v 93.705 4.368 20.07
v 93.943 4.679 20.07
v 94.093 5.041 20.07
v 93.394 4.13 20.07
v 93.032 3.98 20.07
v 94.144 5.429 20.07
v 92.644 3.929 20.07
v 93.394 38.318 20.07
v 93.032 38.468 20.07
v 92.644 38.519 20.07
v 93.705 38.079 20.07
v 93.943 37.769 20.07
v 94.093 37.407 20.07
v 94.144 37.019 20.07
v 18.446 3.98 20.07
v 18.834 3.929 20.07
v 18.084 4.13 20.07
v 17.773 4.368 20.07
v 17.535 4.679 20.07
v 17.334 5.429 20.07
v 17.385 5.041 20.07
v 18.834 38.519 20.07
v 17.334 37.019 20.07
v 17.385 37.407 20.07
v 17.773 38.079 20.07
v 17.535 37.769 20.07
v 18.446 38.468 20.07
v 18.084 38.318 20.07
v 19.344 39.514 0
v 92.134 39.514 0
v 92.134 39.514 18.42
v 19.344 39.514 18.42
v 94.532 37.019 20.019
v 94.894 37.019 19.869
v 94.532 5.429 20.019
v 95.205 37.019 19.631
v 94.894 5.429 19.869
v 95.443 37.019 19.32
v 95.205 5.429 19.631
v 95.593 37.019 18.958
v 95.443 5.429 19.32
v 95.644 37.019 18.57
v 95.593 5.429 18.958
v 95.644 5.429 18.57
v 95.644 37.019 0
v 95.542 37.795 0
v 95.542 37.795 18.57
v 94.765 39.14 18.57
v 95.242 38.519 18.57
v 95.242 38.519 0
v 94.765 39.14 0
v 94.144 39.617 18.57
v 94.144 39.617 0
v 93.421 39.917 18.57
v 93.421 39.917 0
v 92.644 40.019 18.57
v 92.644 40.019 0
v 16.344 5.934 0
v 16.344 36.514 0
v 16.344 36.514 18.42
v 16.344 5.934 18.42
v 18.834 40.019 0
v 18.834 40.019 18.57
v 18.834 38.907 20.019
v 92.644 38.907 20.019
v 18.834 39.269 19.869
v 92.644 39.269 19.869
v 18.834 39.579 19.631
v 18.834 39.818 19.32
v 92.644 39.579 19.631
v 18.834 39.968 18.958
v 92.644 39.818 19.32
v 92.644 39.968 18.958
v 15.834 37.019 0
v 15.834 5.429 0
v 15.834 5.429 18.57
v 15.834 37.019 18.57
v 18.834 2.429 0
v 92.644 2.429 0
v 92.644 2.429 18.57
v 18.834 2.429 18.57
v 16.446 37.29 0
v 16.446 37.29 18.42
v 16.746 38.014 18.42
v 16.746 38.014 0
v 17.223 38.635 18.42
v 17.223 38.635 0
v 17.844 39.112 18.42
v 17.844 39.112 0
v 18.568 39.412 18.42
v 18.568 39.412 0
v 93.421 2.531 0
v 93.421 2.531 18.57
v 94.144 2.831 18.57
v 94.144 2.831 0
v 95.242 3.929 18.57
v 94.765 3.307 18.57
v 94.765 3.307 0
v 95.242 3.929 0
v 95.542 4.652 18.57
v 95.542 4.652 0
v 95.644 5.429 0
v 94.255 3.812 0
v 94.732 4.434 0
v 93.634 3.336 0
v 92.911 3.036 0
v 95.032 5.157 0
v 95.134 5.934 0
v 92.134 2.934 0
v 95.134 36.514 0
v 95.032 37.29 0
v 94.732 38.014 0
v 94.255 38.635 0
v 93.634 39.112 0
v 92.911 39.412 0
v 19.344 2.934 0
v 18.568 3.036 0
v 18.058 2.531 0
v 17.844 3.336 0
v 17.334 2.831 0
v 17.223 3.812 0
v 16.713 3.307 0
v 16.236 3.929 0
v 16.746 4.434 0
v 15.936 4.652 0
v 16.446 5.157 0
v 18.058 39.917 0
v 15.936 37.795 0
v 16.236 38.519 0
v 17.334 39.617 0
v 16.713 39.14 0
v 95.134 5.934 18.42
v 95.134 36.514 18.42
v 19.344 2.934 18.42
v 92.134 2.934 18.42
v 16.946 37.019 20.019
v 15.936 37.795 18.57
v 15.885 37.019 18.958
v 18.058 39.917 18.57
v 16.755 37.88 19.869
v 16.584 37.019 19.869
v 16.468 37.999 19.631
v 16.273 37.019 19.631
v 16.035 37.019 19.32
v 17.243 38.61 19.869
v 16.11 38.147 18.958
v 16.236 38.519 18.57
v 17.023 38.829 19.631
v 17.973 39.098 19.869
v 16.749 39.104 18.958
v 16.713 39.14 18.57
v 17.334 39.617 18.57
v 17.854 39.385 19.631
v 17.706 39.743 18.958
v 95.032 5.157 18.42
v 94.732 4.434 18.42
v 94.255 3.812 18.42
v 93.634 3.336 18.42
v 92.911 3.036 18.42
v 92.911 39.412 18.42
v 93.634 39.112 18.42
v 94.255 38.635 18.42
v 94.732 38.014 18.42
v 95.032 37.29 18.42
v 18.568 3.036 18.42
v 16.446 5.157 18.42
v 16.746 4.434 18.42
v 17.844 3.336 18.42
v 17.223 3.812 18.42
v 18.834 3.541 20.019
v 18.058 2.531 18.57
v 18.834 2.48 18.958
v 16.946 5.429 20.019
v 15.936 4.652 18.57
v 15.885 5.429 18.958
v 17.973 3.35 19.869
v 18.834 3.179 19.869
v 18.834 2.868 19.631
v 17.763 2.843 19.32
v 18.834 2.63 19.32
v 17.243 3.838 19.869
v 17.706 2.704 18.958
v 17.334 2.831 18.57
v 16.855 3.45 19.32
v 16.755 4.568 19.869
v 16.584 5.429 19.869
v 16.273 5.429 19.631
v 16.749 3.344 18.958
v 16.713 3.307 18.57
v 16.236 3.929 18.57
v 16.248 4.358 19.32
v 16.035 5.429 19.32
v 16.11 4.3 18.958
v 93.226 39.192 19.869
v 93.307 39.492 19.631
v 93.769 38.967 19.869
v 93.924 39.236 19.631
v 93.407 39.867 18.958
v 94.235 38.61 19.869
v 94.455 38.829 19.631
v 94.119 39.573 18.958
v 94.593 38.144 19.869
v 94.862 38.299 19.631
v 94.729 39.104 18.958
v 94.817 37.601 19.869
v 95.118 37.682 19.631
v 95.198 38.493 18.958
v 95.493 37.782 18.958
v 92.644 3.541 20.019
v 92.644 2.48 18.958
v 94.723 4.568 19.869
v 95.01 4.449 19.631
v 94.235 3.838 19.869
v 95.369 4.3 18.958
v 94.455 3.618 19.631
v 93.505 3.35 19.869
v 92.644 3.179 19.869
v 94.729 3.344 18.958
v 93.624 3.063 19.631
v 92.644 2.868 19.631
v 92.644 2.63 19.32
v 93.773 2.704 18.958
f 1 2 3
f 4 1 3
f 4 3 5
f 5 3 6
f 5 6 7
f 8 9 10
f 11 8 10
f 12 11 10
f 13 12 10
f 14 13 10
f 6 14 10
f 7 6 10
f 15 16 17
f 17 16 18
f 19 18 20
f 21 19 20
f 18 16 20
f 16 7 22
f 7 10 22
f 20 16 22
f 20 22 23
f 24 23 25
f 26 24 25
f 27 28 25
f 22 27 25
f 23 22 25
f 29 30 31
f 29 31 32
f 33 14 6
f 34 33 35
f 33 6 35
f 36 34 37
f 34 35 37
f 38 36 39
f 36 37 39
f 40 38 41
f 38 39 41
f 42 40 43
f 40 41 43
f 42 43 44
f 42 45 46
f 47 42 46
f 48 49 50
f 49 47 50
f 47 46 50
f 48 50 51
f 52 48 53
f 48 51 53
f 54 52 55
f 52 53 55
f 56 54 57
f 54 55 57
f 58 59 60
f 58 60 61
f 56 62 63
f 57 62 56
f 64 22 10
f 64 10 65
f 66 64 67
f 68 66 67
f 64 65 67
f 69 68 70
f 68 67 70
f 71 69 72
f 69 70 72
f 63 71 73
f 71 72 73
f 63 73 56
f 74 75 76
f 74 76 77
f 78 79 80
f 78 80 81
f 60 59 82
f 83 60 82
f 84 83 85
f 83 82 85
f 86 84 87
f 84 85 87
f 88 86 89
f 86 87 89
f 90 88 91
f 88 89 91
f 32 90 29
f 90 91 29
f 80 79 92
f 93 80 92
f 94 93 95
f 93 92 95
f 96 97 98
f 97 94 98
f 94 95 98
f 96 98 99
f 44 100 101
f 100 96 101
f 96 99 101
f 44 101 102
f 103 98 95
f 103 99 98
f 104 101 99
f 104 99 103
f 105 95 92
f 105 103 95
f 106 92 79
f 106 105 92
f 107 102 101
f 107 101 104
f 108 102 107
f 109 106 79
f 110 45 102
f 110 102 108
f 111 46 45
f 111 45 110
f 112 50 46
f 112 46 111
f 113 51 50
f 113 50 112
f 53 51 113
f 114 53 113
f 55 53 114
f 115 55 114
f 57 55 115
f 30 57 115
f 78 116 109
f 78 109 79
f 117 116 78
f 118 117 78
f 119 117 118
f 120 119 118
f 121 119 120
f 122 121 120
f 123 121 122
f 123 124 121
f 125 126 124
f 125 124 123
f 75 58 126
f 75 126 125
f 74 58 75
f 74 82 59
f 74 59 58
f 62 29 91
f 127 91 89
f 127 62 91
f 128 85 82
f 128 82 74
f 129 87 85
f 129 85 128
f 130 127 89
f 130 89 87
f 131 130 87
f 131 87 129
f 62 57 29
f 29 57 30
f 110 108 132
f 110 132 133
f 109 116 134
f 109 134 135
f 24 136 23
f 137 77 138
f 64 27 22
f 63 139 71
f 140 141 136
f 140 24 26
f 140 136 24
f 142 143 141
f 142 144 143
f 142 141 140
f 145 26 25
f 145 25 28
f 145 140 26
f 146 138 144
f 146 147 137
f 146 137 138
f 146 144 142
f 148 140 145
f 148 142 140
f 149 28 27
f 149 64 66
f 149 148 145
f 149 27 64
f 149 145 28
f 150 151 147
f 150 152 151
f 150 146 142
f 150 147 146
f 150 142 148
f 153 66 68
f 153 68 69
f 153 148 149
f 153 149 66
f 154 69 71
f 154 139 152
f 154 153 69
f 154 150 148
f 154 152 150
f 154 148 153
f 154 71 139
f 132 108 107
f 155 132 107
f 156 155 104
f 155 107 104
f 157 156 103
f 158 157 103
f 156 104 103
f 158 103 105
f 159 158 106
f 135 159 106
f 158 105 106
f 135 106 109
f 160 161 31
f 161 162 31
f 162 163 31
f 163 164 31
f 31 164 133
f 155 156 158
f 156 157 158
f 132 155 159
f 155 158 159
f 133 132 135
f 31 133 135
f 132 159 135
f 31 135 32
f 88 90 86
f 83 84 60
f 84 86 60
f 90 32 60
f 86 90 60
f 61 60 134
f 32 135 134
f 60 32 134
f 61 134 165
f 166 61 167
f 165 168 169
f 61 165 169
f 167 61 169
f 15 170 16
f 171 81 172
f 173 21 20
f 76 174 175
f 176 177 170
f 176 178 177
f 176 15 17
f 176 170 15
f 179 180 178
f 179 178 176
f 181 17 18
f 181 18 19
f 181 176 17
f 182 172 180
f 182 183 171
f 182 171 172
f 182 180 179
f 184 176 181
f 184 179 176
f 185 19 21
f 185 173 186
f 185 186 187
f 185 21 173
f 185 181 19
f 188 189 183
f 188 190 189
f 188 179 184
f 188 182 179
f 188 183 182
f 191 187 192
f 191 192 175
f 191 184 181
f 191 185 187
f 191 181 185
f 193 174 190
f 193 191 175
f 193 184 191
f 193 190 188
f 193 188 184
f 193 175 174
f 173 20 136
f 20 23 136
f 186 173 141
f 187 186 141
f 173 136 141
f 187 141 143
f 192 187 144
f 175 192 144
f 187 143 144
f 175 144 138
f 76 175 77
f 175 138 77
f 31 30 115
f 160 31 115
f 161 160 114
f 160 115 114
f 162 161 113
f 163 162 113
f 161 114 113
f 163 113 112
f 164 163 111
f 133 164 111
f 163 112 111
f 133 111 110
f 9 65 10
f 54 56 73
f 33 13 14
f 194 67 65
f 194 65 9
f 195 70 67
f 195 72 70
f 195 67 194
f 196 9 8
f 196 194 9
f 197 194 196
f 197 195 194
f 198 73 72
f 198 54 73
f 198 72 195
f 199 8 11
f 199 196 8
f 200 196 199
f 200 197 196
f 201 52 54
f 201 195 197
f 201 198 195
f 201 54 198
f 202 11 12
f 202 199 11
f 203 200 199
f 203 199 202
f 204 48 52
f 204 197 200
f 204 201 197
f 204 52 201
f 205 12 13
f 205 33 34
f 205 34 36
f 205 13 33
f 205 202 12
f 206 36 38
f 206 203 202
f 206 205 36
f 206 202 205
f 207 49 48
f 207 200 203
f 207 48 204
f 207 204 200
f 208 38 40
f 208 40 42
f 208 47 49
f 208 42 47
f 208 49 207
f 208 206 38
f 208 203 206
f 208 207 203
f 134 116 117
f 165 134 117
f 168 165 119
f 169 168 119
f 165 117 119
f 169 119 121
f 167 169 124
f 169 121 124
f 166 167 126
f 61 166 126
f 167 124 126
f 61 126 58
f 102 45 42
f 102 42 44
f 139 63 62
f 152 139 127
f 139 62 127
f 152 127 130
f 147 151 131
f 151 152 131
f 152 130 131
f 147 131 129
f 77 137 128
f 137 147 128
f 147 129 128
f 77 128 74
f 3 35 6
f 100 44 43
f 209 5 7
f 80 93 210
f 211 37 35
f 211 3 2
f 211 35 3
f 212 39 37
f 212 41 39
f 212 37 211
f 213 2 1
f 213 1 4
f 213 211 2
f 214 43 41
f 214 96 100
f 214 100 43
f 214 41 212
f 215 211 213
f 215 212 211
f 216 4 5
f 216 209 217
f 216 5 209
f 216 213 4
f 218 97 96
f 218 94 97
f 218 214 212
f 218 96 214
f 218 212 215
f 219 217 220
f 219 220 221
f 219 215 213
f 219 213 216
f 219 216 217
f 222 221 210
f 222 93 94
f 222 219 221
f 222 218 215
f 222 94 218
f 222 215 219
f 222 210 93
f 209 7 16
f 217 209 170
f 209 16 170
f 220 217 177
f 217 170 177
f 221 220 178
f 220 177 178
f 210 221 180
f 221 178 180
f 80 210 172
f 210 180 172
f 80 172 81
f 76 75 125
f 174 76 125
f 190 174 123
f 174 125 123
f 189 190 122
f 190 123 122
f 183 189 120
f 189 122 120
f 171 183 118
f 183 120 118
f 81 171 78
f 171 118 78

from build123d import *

# Parameters (mm, degrees)
PAD_DEPTH    = 20.07
POCKET_DEPTH = 18.42
FILLET_R     = 1.5


with BuildPart() as part:
    # Sketch → Pad (new body)
    with BuildSketch(Plane.XY):
        with BuildLine():
            Line((18.834122, 40.018788), (92.644122, 40.018788))
            ThreePointArc((95.644122, 37.018788), (94.765442, 39.140108), (92.644122, 40.018788))
            Line((95.644122, 37.018788), (95.644122, 5.428788))
            ThreePointArc((92.644122, 2.428788), (94.765442, 3.307467), (95.644122, 5.428788))
            Line((92.644122, 2.428788), (18.834122, 2.428788))
            ThreePointArc((15.834122, 5.428788), (16.712801, 3.307467), (18.834122, 2.428788))
            Line((15.834122, 5.428788), (15.834122, 37.018788))
            ThreePointArc((18.834122, 40.018788), (16.712801, 39.140108), (15.834122, 37.018788))
        make_face()
    extrude(amount=PAD_DEPTH)

    # Sketch001 (on Face9 of Pad) → Pocket (cut)
    with BuildSketch(Plane(origin=(0, 0, 0), x_dir=(1, 0, 0), z_dir=(0, 0, -1))):
        with BuildLine():
            Line((19.344122, -2.933788), (92.134122, -2.933788))
            ThreePointArc((95.134122, -5.933788), (94.255442, -3.812467), (92.134122, -2.933788))
            Line((95.134122, -5.933788), (95.134122, -36.513788))
            ThreePointArc((92.134122, -39.513788), (94.255442, -38.635108), (95.134122, -36.513788))
            Line((92.134122, -39.513788), (19.344122, -39.513788))
            ThreePointArc((16.344122, -36.513788), (17.222801, -38.635108), (19.344122, -39.513788))
            Line((16.344122, -36.513788), (16.344122, -5.933788))
            ThreePointArc((19.344122, -2.933788), (17.222801, -3.812467), (16.344122, -5.933788))
        make_face()
    extrude(amount=-POCKET_DEPTH, mode=Mode.SUBTRACT)

    # Fillet
    fillet_edges = [part.edges().sort_by_distance(p)[0] for p in [
        (15.834122, 21.223788, 20.07),
        (16.712801, 39.140108, 20.07),
        (55.739122, 40.018788, 20.07),
        (94.765442, 39.140108, 20.07),
        (95.644122, 21.223788, 20.07),
        (94.765442, 3.307467, 20.07),
        (55.739122, 2.428788, 20.07),
        (16.712801, 3.307467, 20.07),
    ]]
    fillet(fillet_edges, radius=FILLET_R)


solid = part.part
